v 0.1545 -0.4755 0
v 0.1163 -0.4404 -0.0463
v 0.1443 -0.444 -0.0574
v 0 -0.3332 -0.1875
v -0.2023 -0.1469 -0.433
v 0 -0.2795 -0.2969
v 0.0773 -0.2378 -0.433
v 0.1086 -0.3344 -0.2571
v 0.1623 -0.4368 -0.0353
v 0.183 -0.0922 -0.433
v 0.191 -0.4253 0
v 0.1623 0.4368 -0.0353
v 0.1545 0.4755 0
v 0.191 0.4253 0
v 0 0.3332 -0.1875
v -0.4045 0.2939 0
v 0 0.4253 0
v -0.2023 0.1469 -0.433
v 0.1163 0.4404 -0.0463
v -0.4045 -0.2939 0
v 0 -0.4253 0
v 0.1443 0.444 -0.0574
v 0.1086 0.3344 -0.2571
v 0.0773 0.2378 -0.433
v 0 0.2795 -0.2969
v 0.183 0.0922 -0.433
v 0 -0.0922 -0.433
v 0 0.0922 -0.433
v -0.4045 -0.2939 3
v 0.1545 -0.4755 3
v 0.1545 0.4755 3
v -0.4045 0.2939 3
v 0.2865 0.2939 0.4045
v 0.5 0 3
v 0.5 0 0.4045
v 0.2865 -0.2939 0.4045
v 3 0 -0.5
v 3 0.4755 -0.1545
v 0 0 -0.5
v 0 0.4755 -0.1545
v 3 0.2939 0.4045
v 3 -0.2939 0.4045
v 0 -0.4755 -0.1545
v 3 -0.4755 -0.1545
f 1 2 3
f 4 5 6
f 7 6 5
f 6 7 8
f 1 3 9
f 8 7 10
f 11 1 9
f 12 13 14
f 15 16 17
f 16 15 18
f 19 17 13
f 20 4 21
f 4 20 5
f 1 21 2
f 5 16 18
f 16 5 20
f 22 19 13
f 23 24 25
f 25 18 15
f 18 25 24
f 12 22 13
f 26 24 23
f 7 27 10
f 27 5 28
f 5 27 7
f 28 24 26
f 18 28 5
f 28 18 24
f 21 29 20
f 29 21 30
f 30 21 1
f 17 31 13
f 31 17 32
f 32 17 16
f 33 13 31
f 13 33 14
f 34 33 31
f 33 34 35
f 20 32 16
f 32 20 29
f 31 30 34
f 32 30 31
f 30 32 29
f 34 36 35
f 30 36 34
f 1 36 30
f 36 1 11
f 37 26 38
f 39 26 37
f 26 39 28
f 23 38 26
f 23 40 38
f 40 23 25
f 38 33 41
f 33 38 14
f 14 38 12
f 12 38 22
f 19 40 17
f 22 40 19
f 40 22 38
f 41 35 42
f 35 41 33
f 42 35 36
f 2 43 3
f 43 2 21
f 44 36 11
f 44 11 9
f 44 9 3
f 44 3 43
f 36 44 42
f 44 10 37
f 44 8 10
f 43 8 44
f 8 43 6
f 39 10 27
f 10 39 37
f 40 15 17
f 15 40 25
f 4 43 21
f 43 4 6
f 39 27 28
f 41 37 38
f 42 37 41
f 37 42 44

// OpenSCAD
// A joint of BOSL2's stroke(): two cylinders meeting at a sphere of
// their own radius. Each cylinder ends on a great circle of the sphere,
// and the two circles cross where all three surfaces touch.
// volume = 2 pi r^2 h + pi r^3 / 3 - 4 r^3 / 3, r = 0.5, h = 3
// volume: 4.676622007617597
sphere(d = 1);
cylinder(d = 1, h = 3);
rotate([0, 90, 0]) cylinder(d = 1, h = 3);
